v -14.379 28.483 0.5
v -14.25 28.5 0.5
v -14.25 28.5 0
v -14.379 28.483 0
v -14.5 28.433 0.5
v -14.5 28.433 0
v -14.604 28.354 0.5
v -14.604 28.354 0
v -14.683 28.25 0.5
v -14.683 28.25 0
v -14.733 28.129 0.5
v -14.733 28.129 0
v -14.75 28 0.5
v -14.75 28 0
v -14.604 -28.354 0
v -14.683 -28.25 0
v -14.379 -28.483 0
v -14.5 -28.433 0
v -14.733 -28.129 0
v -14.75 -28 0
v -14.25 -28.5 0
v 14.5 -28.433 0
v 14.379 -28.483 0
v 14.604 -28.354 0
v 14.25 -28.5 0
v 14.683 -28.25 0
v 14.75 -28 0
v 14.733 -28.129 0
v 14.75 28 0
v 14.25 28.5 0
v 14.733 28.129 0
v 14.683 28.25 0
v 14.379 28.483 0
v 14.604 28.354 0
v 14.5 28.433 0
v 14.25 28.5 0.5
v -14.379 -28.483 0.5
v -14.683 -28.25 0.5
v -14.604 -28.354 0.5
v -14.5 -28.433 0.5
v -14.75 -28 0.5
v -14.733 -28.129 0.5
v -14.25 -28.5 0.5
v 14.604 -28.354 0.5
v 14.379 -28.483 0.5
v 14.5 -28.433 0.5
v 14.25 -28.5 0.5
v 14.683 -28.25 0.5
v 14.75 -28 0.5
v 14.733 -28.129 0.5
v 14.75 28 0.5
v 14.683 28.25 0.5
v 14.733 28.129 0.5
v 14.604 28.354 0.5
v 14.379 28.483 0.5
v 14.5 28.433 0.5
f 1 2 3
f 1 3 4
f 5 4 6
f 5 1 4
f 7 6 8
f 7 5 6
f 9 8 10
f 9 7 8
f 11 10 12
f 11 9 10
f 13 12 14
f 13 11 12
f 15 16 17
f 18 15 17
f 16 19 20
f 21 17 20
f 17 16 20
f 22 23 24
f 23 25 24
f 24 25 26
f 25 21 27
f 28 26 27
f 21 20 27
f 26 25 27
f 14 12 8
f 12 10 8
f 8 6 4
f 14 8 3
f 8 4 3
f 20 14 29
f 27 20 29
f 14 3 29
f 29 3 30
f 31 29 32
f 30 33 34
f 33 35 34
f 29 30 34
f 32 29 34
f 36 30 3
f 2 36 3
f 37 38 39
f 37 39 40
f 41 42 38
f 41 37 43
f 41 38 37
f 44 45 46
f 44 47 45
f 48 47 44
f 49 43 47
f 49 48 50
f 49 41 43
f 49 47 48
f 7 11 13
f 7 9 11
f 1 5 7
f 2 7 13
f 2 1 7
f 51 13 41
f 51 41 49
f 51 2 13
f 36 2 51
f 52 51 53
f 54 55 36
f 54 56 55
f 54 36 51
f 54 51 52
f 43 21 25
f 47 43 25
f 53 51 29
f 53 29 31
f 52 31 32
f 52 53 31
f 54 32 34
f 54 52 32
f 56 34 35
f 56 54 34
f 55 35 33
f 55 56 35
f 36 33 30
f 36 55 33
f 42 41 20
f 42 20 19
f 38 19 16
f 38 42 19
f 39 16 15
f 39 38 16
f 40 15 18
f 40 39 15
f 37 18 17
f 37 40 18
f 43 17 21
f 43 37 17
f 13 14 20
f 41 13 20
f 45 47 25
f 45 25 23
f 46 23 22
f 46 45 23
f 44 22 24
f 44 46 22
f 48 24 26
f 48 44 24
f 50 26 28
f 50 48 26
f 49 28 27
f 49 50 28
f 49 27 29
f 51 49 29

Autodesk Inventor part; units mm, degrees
ref_plane "YZ Plane" through (0, 0, 0) normal (1, 0, 0) x (0, 1, 0)
ref_plane "XZ Plane" through (0, 0, 0) normal (0, 1, 0) x (-1, 0, 0)
ref_plane "XY Plane" through (0, 0, 0) normal (0, 0, 1) x (1, 0, 0)
sketch "Sketch1" plane through (0, 0, 0) normal (0, 0, 1) x (1, 0, 0)
  line L0 (-14.75, -28.5) -> (14.75, -28.5)
  line L1 (14.75, -28.5) -> (14.75, 28.5)
  line L2 (14.75, 28.5) -> (-14.75, 28.5)
  line L3 (-14.75, 28.5) -> (-14.75, -28.5)
  line L4 (-14.75, -28.5) -> (14.75, 28.5) construction
  line L5 (14.75, -28.5) -> (-14.75, 28.5) construction
  point P0 (0, 0)
  dimension "d0" = 29.5
  dimension "d1" = 57
extrude "Extrusion1" add sketch "Sketch1" along normal blind 0.5
fillet "Fillet1" radius 0.5 4 edges at (-14.75, -28.5, 0.25) (14.75, -28.5, 0.25) (14.75, 28.5, 0.25) (-14.75, 28.5, 0.25)
sketch "Sketch3" plane through (0, 0, 0.5) normal (0, 0, 1) x (1, 0, 0)
  arc A0 (-14.25, 28.5) -> (-14.75, 28) centre (-14.25, 28) ccw projected
  line L0 (-14.75, 28) -> (-14.75, -28) projected
  arc A1 (-14.75, -28) -> (-14.25, -28.5) centre (-14.25, -28) ccw projected
  line L1 (-14.25, -28.5) -> (14.25, -28.5) projected
  arc A2 (14.25, -28.5) -> (14.75, -28) centre (14.25, -28) ccw projected
  line L2 (14.75, -28) -> (14.75, 28) projected
  arc A3 (14.75, 28) -> (14.25, 28.5) centre (14.25, 28) ccw projected
  line L3 (14.25, 28.5) -> (-14.25, 28.5) projected
  point P0 (0, 0)
properties part number "oled_mask"
